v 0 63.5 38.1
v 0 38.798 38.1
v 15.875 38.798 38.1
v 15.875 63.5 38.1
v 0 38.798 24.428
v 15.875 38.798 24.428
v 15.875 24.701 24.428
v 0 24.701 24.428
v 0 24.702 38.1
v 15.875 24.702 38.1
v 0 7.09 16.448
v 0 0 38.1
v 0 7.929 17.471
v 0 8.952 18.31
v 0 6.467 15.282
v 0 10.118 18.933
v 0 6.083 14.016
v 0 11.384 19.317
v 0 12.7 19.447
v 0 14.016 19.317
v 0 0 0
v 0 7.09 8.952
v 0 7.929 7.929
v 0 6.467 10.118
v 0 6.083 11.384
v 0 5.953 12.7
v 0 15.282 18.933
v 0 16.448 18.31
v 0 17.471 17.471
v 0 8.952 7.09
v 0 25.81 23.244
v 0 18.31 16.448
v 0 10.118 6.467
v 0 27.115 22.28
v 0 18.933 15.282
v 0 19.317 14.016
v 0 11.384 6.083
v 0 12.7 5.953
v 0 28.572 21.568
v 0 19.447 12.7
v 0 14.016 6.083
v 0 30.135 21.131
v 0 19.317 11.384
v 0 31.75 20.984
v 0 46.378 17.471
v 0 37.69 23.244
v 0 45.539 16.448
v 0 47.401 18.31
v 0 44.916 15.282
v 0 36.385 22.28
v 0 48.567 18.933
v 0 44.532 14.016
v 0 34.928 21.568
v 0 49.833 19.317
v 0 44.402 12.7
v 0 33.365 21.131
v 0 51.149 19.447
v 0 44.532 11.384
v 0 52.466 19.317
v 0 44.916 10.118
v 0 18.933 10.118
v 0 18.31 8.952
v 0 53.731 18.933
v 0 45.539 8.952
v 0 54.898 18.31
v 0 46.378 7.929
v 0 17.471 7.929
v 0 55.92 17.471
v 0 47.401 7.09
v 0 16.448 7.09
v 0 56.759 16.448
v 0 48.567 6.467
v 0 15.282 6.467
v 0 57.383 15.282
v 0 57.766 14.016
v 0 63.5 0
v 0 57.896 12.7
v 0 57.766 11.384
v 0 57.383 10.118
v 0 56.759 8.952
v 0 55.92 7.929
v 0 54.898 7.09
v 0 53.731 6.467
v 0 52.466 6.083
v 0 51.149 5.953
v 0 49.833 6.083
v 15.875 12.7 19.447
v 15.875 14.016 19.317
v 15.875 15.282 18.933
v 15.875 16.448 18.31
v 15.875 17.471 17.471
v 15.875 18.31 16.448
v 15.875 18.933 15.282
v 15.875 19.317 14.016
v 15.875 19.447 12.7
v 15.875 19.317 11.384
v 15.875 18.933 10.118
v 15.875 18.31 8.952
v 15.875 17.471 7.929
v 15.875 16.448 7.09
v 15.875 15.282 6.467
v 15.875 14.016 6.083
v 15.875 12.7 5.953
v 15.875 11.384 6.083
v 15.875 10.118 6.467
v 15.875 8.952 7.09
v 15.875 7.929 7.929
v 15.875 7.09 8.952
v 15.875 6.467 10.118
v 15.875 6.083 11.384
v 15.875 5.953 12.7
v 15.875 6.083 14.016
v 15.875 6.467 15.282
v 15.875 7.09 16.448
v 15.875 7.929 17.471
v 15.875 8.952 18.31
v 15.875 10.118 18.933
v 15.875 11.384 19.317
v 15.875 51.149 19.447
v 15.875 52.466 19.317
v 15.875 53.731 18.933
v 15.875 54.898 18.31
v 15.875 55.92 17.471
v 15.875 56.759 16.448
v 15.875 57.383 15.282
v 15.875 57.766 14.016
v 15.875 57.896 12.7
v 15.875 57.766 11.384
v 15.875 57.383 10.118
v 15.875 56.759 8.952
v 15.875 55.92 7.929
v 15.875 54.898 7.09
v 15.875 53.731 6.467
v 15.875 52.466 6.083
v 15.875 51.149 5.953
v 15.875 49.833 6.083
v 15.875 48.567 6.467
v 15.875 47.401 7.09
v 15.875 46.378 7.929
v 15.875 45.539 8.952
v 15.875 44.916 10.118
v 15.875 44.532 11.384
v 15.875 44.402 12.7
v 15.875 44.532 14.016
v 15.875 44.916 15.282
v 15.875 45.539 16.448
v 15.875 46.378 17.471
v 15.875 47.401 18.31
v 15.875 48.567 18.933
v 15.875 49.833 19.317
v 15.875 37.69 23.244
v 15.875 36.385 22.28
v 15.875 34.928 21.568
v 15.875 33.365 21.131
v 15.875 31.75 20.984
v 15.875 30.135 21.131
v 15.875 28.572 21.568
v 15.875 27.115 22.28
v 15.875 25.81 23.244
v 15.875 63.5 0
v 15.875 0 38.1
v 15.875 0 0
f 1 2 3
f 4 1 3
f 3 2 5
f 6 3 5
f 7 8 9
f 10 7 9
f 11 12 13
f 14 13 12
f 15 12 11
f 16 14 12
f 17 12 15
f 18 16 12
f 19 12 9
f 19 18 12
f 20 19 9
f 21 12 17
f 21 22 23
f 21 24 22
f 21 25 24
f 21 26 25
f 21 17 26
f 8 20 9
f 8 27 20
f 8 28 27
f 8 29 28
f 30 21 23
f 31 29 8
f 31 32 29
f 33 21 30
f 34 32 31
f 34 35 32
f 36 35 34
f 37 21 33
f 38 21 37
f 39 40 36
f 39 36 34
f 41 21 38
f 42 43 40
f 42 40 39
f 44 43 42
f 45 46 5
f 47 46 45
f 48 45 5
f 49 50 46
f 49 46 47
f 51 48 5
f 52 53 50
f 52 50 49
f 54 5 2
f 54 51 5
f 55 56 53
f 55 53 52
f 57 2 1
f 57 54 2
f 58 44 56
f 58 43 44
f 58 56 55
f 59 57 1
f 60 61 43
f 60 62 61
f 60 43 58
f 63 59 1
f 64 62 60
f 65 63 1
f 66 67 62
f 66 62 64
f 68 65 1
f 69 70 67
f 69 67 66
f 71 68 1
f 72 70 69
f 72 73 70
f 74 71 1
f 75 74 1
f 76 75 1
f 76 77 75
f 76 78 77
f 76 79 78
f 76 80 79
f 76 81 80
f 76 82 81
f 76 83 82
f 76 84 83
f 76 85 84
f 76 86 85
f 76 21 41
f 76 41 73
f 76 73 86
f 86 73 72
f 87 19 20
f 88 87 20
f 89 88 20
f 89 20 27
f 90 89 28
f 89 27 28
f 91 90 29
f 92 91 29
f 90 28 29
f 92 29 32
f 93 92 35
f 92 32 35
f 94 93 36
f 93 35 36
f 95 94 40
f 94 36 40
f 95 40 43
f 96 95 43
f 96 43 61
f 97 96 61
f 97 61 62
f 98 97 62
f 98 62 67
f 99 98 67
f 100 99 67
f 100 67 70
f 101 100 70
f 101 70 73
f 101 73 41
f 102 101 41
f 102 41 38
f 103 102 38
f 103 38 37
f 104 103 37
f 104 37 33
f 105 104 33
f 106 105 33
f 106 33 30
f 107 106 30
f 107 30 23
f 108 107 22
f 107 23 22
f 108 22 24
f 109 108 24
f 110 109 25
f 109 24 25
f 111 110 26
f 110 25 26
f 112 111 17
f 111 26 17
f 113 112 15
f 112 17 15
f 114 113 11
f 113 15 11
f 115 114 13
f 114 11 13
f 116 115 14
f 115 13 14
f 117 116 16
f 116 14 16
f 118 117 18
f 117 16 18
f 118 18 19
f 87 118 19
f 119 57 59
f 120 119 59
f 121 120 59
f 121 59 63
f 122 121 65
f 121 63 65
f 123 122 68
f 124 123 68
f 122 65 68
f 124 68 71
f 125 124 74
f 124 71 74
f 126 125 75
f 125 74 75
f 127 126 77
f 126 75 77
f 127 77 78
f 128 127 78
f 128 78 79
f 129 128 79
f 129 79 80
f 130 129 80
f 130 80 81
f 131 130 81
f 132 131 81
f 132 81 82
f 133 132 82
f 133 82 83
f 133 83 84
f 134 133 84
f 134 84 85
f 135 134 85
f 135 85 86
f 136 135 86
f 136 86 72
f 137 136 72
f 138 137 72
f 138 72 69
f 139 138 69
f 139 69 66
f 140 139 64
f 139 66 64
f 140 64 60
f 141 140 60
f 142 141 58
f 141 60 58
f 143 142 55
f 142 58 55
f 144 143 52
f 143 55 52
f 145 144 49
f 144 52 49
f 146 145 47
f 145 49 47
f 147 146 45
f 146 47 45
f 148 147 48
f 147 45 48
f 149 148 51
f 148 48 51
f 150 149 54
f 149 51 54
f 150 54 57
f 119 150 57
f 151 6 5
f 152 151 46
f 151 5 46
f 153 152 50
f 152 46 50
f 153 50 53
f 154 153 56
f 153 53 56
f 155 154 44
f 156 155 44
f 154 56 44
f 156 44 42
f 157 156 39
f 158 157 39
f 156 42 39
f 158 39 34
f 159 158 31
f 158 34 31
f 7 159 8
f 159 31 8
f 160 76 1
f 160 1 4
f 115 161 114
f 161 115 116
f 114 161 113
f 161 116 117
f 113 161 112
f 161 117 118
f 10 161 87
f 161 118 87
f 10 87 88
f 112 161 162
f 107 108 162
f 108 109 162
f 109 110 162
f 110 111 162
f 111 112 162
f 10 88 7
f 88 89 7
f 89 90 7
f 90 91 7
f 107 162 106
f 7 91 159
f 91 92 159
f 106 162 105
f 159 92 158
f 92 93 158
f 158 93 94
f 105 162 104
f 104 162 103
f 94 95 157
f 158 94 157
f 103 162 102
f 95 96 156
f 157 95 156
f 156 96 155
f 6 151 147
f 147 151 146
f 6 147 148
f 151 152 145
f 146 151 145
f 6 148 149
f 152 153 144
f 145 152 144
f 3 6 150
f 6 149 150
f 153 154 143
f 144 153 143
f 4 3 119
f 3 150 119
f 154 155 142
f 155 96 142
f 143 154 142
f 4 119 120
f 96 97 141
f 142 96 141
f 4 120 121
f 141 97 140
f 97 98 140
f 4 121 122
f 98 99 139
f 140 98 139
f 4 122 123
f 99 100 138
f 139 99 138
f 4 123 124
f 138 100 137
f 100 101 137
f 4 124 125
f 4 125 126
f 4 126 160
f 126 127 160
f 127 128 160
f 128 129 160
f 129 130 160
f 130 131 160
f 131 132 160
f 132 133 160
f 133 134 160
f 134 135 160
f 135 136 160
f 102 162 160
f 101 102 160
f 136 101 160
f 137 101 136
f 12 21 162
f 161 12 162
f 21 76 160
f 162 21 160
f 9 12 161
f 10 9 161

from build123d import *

# Parameters (mm, degrees)
SKETCH1_W           = 15.875
SKETCH1_H           = 63.5
BOSS_EXTRUDE1_DEPTH = 38.1
CUT_EXTRUDE1_DEPTH  = 16.875
SKETCH3_R           = 6.746875
CUT_EXTRUDE2_DEPTH  = 16.875


with BuildPart() as part:
    # Sketch1 → Boss-Extrude1 (new body)
    with BuildSketch(Plane.XY):
        with Locations((7.9375, 31.75)):
            Rectangle(SKETCH1_W, SKETCH1_H)
    extrude(amount=BOSS_EXTRUDE1_DEPTH)

    # Sketch2 → Cut-Extrude1 (cut, through all)
    with BuildSketch(Plane.ZY):
        with BuildLine():
            ThreePointArc((24.4280023, 38.7985), (20.984165451, 31.75), (24.4280023, 24.7015))
            Line((24.4280023, 24.7015), (38.1, 24.7015))
            Line((38.1, 24.7015), (38.1, 38.7985))
            Line((38.1, 38.7985), (24.4280023, 38.7985))
        make_face()
    extrude(amount=-CUT_EXTRUDE1_DEPTH, mode=Mode.SUBTRACT)

    # Sketch3 → Cut-Extrude2 (cut, through all)
    with BuildSketch(Plane.ZY):
        with Locations((12.7, 51.14925)):
            Circle(SKETCH3_R)
        with Locations((12.7, 12.7)):
            Circle(SKETCH3_R)
    extrude(amount=-CUT_EXTRUDE2_DEPTH, mode=Mode.SUBTRACT)


solid = part.part
